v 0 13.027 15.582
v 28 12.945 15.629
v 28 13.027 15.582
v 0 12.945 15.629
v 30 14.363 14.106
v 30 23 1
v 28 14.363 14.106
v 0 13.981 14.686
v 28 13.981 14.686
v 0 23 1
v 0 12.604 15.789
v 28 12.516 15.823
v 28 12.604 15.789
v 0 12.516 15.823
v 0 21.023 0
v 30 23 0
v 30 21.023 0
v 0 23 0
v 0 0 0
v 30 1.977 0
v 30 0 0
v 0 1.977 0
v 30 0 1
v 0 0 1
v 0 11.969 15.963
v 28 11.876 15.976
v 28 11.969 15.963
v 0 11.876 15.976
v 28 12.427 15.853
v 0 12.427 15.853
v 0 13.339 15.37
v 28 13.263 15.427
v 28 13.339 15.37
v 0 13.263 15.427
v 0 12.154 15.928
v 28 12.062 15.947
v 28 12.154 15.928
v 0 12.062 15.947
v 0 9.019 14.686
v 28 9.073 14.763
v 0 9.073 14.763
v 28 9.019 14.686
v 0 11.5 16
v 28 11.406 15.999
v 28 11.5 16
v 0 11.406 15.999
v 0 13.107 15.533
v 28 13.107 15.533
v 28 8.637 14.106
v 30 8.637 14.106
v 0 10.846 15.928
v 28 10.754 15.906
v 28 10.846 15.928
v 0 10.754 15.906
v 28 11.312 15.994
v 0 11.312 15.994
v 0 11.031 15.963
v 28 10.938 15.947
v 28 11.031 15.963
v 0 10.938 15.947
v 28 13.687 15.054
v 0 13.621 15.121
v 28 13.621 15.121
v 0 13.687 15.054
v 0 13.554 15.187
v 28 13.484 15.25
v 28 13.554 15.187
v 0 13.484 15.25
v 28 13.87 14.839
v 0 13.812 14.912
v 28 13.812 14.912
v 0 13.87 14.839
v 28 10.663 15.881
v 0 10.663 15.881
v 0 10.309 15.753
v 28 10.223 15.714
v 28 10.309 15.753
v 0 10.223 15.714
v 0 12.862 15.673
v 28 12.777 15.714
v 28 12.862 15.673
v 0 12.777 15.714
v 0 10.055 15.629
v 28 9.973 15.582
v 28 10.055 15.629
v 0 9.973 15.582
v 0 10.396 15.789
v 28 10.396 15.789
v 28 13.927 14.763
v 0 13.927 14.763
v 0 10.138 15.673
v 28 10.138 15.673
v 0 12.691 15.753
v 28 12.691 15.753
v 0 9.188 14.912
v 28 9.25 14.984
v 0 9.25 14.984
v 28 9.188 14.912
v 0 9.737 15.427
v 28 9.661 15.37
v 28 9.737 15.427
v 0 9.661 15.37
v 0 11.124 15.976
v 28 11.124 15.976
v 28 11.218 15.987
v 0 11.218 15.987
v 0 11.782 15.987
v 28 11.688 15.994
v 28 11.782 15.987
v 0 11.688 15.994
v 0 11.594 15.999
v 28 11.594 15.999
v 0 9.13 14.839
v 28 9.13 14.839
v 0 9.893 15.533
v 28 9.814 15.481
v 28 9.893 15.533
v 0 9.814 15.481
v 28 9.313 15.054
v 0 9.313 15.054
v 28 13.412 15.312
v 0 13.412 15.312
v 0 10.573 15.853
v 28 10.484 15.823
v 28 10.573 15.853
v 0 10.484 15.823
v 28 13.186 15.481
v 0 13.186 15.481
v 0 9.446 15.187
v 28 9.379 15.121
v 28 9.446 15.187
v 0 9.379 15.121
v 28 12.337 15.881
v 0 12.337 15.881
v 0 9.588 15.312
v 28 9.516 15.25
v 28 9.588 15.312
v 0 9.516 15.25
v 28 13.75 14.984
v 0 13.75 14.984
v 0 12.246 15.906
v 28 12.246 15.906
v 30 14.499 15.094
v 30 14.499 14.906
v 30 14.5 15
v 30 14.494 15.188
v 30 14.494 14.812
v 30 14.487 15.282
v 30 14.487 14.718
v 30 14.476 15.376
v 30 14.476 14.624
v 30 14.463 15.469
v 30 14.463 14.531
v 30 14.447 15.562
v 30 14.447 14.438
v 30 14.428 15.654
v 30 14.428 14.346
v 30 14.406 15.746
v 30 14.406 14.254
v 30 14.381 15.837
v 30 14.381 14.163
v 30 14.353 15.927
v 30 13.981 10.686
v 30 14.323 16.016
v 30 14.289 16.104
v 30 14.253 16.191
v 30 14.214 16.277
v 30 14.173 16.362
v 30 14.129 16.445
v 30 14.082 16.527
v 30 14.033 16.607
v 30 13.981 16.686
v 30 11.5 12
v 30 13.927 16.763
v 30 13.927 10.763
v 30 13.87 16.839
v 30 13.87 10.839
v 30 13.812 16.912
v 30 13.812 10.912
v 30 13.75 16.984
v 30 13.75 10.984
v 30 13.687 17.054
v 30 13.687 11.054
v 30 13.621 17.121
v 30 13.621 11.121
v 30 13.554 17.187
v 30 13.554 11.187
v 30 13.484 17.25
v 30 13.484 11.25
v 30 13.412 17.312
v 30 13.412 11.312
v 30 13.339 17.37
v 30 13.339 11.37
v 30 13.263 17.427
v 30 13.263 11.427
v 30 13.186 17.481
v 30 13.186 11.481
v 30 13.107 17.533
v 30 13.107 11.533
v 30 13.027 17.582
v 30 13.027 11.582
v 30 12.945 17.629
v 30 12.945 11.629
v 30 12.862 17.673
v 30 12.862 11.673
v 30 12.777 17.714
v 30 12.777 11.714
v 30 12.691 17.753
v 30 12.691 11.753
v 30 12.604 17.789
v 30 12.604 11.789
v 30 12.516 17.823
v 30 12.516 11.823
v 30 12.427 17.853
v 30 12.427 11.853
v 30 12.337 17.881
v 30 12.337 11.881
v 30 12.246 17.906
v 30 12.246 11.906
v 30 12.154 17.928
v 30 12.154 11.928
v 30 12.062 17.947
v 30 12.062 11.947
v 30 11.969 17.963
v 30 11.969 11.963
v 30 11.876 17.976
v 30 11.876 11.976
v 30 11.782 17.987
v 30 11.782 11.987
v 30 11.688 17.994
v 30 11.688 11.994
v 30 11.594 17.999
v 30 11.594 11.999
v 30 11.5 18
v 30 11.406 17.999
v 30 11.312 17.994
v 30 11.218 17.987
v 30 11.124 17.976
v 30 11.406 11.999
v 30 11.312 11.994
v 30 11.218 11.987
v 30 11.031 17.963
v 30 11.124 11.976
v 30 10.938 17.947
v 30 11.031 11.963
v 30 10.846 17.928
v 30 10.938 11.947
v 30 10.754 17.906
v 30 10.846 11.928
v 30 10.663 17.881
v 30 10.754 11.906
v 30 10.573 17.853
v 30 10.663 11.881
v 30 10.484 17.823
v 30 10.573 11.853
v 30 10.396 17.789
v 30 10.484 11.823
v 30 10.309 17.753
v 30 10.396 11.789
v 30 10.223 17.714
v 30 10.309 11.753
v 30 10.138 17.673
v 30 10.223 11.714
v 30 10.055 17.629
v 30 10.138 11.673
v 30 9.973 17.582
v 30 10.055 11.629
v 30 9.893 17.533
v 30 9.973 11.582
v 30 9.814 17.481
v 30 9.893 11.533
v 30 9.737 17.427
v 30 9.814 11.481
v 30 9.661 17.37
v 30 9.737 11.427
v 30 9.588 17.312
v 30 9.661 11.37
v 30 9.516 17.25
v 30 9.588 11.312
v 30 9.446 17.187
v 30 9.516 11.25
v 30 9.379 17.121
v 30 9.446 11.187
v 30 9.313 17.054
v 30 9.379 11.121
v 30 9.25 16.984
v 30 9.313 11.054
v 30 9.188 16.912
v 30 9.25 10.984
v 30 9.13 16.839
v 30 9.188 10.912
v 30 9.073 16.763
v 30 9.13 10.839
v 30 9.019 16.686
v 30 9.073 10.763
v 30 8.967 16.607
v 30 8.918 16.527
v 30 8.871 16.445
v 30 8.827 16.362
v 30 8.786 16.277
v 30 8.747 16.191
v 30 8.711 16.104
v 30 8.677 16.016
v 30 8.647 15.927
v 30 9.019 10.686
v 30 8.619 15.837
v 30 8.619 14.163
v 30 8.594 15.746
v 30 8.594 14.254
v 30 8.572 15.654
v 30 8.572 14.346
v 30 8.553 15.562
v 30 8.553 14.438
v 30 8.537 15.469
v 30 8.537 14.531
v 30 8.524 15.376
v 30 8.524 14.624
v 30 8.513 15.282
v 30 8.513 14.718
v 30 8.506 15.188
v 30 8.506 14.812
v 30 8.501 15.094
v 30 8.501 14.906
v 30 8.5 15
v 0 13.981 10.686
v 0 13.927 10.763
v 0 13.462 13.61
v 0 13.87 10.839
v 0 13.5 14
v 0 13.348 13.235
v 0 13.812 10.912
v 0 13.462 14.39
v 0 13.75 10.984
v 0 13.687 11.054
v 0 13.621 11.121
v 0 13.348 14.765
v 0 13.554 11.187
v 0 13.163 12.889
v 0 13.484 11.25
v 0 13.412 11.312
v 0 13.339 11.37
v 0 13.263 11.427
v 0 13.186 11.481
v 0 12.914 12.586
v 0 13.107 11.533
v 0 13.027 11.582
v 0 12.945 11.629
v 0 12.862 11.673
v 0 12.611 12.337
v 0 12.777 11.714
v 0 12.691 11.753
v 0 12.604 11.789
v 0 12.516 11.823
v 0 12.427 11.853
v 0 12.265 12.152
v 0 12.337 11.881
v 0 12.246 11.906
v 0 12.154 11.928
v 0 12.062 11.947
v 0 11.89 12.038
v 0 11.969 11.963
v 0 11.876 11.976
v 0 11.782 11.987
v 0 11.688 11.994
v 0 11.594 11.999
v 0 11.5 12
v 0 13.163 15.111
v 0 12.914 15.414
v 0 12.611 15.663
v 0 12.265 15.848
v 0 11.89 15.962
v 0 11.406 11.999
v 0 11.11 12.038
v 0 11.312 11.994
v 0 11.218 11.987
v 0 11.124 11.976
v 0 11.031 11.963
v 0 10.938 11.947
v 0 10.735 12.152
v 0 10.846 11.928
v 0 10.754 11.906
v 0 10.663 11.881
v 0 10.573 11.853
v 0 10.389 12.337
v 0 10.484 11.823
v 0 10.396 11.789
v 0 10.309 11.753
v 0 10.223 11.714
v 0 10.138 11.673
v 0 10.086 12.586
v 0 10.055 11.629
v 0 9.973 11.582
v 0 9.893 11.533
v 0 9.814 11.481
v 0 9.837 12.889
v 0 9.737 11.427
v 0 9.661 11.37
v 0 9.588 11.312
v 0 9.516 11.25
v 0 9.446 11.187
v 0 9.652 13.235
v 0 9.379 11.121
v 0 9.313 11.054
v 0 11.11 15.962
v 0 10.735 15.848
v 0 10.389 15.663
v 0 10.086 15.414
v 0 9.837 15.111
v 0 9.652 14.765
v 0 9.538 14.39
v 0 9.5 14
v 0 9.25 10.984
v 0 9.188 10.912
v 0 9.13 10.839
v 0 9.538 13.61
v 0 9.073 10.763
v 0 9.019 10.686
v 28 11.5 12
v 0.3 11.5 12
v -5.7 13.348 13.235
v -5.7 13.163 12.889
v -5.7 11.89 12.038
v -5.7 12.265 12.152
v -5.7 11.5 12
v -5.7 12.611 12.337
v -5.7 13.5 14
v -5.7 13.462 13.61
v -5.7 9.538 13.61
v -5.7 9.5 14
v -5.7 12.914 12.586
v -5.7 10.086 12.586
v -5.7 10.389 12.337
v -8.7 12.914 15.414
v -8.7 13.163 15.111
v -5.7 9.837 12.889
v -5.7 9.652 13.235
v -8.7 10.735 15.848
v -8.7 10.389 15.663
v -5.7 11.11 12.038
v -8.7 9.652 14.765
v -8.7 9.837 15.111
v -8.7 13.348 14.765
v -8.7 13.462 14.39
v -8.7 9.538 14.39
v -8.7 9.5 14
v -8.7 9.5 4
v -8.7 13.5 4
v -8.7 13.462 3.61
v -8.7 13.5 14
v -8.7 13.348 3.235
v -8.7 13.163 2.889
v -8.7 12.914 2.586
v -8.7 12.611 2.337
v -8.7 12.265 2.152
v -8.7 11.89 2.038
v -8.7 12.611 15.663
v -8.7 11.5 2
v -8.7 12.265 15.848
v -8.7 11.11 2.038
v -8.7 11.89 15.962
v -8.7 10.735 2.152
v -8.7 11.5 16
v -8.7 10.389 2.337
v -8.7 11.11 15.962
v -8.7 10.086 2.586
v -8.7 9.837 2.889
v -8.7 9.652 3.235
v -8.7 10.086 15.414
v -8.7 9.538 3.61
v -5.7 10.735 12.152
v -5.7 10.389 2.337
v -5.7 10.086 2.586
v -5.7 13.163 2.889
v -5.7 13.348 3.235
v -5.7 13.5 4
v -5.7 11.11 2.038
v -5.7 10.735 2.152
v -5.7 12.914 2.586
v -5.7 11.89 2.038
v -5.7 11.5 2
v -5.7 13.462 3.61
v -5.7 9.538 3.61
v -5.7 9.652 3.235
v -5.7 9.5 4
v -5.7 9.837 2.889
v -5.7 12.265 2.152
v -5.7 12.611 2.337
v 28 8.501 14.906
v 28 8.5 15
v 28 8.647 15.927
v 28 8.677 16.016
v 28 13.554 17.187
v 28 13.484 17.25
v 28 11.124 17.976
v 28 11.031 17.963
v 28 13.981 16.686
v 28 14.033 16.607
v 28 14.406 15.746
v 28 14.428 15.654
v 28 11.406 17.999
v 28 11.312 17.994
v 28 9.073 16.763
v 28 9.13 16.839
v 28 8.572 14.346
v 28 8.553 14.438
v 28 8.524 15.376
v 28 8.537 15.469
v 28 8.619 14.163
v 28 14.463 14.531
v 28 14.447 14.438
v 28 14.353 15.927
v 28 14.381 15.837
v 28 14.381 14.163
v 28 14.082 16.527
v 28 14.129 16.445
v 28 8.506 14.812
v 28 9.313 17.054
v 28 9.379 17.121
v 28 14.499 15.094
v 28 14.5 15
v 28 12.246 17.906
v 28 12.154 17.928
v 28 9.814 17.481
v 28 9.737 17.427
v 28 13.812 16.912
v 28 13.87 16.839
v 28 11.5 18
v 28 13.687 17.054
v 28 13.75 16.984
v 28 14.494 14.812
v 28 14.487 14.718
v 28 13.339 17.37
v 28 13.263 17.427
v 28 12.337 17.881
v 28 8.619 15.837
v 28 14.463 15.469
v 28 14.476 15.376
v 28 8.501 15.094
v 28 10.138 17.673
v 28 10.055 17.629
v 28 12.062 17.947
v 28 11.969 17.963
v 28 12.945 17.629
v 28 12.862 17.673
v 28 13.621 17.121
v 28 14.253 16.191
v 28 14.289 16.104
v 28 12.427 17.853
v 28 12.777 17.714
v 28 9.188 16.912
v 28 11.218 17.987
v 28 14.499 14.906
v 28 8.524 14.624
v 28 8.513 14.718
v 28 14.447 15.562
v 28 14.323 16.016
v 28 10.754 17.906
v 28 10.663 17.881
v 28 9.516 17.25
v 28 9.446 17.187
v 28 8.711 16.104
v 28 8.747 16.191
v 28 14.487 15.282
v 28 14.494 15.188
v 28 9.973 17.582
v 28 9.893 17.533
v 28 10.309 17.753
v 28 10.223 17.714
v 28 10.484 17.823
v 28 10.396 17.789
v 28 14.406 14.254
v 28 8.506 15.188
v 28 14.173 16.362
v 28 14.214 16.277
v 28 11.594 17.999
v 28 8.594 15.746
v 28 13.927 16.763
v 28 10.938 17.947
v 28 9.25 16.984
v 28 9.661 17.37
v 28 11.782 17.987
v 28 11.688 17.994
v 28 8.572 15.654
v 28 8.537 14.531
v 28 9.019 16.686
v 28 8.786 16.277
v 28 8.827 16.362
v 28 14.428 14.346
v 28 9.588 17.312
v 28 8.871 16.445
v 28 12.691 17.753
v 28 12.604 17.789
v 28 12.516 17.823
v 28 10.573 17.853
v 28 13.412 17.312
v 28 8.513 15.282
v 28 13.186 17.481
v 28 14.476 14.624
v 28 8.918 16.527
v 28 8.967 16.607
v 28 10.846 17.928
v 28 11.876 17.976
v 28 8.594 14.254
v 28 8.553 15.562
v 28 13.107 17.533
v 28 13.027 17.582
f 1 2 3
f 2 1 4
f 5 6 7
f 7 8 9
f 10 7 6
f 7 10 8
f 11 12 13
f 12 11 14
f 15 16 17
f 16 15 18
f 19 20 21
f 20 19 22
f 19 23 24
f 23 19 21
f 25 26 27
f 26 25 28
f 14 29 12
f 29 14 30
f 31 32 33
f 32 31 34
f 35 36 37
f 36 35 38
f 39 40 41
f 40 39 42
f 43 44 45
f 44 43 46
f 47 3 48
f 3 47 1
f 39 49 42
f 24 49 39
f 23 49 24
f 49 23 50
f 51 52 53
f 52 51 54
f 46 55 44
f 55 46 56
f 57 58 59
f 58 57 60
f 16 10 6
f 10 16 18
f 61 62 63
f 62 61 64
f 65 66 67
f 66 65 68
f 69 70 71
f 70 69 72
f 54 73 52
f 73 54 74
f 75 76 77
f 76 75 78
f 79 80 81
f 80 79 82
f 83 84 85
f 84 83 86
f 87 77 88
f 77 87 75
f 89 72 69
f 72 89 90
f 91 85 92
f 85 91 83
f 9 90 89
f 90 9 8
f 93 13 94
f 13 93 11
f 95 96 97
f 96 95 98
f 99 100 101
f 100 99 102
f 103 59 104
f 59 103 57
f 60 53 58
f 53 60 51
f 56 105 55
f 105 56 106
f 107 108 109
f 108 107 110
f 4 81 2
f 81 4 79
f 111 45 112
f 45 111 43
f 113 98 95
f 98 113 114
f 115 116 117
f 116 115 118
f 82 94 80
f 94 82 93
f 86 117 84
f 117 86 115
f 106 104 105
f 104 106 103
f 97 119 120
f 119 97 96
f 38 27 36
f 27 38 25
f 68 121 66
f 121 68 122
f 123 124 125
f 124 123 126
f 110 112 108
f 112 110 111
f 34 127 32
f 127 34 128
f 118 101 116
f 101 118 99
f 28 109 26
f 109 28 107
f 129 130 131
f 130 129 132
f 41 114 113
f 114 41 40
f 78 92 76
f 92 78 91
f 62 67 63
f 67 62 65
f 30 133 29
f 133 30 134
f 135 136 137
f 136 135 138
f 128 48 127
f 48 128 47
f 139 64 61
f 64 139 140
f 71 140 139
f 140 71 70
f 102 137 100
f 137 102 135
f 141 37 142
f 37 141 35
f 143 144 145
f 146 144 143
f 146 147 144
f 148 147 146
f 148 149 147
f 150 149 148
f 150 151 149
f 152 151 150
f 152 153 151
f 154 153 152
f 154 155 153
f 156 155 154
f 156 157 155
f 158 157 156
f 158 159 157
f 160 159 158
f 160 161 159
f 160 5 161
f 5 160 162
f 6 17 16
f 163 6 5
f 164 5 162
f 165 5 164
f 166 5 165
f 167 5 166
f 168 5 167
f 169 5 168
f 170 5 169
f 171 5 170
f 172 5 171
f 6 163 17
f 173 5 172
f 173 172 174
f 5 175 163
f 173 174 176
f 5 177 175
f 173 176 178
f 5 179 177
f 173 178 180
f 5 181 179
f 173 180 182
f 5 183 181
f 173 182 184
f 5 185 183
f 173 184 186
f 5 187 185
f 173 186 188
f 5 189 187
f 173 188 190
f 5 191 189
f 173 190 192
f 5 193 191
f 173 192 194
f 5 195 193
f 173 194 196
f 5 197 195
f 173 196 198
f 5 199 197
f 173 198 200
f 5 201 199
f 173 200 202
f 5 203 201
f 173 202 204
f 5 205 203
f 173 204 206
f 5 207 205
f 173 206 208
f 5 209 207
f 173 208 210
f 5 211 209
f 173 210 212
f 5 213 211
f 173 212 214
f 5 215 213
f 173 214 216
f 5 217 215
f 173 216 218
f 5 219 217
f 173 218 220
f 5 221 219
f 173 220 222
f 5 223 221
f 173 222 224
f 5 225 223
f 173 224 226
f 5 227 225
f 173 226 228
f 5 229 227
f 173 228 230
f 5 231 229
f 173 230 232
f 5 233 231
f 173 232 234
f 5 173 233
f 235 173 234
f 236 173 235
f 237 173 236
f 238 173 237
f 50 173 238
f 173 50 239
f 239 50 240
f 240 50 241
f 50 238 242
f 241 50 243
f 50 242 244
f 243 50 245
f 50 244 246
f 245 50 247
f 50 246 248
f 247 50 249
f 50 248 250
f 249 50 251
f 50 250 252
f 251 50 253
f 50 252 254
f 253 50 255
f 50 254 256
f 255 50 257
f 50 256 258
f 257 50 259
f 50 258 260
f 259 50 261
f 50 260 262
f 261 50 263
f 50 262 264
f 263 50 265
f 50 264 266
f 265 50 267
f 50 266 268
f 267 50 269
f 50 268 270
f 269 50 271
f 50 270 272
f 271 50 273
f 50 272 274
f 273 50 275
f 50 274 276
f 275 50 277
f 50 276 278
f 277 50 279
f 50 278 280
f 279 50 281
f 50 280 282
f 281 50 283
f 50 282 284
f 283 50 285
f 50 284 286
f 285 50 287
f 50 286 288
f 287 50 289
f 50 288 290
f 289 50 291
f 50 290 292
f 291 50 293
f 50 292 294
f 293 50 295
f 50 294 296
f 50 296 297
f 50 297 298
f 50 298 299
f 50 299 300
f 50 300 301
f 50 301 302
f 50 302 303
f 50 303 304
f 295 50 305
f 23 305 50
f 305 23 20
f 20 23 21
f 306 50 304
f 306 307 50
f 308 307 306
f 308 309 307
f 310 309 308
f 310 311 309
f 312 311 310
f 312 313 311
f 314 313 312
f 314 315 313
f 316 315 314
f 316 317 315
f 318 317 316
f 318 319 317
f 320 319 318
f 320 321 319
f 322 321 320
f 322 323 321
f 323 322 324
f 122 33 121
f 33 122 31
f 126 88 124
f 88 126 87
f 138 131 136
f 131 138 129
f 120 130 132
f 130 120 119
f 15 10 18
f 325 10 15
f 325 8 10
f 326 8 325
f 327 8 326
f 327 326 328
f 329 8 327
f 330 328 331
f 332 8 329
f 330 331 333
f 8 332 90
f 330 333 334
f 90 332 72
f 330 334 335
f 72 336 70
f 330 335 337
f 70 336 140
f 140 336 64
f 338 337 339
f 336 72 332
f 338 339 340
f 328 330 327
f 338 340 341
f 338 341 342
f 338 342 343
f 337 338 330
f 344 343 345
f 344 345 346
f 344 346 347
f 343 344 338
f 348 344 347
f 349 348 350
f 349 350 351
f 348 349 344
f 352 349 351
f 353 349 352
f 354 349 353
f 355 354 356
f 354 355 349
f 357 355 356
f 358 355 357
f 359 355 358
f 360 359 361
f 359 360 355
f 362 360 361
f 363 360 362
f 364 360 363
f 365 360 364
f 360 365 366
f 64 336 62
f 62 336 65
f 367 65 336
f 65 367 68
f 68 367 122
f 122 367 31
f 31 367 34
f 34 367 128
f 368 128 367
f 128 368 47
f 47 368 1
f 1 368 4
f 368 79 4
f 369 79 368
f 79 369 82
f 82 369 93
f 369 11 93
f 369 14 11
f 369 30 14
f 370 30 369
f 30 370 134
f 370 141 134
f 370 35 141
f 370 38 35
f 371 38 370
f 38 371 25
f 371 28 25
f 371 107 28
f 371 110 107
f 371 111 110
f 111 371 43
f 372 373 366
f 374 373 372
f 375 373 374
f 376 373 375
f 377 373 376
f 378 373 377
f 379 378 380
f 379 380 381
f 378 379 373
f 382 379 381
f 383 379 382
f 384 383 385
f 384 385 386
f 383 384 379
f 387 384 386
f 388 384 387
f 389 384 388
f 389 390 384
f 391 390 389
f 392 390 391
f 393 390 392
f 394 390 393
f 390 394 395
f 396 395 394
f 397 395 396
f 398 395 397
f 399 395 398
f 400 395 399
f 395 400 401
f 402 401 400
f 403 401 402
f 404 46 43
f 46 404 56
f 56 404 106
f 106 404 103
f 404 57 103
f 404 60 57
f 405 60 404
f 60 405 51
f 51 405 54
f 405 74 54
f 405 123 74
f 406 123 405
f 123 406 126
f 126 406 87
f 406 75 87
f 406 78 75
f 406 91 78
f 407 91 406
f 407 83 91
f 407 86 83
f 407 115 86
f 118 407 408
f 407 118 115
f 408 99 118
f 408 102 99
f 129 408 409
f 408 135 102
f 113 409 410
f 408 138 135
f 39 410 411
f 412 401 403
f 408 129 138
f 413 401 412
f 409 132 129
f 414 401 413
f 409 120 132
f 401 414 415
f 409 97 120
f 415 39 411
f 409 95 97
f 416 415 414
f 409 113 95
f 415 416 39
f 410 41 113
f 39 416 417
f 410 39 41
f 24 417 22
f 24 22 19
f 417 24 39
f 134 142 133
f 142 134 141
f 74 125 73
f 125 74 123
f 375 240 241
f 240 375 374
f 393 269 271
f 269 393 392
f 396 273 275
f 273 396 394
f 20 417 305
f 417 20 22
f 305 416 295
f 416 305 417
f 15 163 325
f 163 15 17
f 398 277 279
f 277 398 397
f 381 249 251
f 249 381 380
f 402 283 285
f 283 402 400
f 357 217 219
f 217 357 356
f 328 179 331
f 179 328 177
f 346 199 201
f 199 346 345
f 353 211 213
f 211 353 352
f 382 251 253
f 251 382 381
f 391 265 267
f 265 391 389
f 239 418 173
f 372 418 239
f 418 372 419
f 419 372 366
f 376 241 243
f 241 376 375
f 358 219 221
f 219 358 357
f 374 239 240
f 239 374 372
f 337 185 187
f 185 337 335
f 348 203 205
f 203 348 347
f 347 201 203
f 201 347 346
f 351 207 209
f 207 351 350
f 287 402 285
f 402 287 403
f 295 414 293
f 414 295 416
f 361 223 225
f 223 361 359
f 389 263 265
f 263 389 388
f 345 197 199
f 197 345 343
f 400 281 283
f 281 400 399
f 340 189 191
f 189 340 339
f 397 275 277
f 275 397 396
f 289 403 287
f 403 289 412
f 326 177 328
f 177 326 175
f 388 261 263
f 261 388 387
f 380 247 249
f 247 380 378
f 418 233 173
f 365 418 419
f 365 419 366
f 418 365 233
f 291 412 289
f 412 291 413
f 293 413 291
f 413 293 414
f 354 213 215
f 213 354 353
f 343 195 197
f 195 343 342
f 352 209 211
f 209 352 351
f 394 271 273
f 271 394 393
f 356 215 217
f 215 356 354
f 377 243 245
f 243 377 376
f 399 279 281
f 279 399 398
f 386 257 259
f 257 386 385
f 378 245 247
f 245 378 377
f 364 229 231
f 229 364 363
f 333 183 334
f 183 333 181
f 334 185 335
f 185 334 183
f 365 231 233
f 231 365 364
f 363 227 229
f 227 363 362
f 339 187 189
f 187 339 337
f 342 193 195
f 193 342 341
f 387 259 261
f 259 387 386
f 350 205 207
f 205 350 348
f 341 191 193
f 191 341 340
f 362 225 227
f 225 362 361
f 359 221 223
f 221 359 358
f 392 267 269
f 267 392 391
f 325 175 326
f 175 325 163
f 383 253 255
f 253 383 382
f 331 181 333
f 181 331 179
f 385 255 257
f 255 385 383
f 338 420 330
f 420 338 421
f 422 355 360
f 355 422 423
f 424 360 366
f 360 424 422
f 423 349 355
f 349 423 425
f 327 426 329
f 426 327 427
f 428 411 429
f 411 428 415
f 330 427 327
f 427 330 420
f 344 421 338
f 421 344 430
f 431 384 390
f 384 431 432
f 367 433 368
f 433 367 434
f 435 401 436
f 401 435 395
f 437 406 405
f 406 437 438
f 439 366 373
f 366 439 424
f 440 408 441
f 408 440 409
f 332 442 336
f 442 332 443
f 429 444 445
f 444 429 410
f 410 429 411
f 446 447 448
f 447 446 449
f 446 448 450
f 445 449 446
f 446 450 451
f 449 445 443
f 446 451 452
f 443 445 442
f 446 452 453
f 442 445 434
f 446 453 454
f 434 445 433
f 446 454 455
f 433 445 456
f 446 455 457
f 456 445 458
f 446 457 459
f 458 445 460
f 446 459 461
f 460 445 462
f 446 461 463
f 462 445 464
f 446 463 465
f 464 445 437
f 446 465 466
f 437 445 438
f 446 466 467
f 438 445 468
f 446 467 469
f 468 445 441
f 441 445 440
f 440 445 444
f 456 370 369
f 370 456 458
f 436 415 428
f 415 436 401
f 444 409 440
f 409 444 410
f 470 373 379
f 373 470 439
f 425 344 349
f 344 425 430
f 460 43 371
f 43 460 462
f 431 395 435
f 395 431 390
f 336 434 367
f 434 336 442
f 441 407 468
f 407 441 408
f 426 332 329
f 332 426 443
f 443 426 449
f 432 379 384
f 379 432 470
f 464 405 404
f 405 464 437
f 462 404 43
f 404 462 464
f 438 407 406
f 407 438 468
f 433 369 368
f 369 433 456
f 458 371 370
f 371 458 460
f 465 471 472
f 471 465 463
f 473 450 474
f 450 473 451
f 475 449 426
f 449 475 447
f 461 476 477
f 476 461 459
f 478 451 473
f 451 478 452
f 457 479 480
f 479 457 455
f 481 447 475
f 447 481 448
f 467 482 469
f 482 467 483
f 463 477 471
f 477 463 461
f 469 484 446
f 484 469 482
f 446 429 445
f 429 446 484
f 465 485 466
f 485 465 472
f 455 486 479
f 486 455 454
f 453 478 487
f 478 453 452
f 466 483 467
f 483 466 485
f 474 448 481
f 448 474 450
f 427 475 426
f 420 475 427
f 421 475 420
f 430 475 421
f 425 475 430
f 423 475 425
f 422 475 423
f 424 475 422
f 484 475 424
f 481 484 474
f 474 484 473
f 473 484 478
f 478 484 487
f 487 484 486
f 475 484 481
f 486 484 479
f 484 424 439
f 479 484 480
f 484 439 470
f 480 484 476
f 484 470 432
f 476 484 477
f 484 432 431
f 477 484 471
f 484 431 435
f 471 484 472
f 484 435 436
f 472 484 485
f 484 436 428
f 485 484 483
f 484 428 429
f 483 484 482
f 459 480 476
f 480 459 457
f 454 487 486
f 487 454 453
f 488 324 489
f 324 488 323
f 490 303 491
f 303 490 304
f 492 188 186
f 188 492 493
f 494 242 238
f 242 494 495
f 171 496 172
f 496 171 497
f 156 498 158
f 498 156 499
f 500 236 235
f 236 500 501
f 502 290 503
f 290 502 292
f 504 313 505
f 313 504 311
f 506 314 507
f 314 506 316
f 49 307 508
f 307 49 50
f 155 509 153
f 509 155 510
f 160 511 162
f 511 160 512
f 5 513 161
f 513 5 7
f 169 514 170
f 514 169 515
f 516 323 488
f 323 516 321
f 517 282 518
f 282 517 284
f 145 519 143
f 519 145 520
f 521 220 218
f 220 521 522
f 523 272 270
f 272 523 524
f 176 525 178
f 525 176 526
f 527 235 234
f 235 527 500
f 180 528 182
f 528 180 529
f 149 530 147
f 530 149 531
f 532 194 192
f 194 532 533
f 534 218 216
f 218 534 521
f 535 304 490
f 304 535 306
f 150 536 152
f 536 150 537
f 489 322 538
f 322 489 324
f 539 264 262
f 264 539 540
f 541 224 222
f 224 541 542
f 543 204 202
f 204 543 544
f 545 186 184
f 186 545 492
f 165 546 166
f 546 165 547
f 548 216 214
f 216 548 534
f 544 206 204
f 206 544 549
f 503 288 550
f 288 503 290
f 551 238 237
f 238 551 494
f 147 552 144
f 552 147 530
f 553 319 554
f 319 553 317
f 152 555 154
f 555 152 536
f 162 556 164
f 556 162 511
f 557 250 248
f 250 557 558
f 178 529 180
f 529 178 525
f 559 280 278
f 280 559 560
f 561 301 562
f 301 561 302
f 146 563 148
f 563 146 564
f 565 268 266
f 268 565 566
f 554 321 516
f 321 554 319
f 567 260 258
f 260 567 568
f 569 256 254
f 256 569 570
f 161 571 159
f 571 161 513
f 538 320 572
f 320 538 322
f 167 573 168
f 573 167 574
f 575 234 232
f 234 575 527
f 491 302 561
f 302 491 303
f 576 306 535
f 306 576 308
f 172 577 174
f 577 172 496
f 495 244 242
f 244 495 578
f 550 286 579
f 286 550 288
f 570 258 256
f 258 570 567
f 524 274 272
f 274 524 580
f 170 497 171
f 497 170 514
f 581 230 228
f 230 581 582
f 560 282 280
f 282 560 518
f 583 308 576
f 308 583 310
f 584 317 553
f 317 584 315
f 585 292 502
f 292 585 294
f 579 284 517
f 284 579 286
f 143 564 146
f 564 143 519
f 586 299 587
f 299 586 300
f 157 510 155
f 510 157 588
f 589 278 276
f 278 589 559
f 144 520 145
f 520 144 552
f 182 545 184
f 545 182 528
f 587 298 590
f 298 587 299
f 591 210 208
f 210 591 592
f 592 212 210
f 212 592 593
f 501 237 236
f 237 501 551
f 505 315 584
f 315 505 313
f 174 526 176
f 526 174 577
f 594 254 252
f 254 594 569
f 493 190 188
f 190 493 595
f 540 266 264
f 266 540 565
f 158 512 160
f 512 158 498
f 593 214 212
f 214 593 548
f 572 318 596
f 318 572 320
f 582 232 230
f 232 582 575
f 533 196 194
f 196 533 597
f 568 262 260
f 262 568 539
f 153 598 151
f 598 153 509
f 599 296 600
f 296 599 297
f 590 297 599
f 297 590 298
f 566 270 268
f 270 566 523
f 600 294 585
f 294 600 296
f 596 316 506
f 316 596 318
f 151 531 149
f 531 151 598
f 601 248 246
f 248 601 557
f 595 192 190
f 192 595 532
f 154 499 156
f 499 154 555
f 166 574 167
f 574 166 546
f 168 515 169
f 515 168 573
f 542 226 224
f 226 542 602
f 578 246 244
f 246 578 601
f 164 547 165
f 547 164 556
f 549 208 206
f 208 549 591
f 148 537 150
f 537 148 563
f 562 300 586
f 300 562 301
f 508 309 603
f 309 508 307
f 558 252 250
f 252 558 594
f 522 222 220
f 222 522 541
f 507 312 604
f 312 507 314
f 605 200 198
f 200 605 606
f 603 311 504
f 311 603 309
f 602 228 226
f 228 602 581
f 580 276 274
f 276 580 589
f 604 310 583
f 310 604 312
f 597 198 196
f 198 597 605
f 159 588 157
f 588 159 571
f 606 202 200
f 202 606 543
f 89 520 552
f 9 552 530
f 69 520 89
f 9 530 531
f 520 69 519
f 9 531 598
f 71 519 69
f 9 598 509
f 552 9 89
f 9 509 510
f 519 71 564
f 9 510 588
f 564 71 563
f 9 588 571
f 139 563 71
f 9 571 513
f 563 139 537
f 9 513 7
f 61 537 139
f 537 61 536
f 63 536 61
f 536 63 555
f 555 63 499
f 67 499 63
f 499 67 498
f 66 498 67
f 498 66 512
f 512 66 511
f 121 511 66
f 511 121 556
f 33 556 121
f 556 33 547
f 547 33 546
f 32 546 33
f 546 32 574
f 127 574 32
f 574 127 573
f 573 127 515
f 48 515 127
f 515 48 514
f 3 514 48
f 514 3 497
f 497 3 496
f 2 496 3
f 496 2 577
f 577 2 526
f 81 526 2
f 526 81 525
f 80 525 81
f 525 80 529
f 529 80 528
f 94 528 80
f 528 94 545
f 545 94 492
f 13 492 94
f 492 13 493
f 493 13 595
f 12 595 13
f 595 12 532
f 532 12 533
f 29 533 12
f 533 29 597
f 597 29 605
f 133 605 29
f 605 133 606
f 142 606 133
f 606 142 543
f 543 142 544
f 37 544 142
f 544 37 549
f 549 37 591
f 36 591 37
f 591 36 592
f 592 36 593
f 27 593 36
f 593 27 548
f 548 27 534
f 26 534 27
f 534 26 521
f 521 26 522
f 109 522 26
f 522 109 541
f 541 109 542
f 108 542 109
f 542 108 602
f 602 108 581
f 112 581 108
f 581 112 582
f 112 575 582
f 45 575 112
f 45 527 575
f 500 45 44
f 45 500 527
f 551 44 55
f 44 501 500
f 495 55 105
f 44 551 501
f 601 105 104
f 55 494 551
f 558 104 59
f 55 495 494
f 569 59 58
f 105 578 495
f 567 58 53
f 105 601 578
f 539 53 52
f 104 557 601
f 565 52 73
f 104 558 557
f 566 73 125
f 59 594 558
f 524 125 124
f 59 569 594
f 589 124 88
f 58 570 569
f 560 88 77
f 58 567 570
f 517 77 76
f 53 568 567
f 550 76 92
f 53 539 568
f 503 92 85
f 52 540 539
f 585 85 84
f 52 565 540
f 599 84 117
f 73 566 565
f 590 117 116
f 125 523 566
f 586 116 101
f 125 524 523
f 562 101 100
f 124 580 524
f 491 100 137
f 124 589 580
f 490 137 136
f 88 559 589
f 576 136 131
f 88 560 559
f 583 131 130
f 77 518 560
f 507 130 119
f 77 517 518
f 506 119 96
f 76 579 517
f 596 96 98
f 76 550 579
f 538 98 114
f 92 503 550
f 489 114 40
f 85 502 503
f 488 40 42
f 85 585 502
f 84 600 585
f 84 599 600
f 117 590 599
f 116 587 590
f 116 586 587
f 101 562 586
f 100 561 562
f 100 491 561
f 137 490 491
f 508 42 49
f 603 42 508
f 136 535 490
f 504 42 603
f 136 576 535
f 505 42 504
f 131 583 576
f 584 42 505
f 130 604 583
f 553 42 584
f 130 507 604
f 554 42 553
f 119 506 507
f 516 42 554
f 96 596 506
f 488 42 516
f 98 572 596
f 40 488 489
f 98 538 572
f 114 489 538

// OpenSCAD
// file: gancho.scad
module ganchos(n=1){    
    for (i=[0:1:n-1]){
        translate([0,40*i,,0]) rotate([0, 90, 0]) translate([0, 0, -9]) {
            cylinder(d = 4, h=9, $fn = 32);
            hull(){
                cylinder(d = 4, h=3, $fn = 32);
                translate([10, 0, 0]) cylinder(d = 4, h=3, $fn = 32);
            } 
        }
    }   
}

// ganchos(3);
// main file
include <gancho.scad>

module angle(x){
    hull(){
        cube([x, 23, 1]);
        translate([0,23/2,13]) rotate([0,90,0]) cylinder(d = 6, h = x, $fn = 200);
    }
}

module holder(){
   difference() {
        angle(30);
        translate([-1,0,-4]) angle(32);
   } 
   translate([30 - 2,23/2,13 + 2]) rotate([0,90,0]) cylinder(d = 6, h = 2, $fn = 200);
   translate([0.3, 23/2, 13 + 1]) ganchos(1);
}

holder();
